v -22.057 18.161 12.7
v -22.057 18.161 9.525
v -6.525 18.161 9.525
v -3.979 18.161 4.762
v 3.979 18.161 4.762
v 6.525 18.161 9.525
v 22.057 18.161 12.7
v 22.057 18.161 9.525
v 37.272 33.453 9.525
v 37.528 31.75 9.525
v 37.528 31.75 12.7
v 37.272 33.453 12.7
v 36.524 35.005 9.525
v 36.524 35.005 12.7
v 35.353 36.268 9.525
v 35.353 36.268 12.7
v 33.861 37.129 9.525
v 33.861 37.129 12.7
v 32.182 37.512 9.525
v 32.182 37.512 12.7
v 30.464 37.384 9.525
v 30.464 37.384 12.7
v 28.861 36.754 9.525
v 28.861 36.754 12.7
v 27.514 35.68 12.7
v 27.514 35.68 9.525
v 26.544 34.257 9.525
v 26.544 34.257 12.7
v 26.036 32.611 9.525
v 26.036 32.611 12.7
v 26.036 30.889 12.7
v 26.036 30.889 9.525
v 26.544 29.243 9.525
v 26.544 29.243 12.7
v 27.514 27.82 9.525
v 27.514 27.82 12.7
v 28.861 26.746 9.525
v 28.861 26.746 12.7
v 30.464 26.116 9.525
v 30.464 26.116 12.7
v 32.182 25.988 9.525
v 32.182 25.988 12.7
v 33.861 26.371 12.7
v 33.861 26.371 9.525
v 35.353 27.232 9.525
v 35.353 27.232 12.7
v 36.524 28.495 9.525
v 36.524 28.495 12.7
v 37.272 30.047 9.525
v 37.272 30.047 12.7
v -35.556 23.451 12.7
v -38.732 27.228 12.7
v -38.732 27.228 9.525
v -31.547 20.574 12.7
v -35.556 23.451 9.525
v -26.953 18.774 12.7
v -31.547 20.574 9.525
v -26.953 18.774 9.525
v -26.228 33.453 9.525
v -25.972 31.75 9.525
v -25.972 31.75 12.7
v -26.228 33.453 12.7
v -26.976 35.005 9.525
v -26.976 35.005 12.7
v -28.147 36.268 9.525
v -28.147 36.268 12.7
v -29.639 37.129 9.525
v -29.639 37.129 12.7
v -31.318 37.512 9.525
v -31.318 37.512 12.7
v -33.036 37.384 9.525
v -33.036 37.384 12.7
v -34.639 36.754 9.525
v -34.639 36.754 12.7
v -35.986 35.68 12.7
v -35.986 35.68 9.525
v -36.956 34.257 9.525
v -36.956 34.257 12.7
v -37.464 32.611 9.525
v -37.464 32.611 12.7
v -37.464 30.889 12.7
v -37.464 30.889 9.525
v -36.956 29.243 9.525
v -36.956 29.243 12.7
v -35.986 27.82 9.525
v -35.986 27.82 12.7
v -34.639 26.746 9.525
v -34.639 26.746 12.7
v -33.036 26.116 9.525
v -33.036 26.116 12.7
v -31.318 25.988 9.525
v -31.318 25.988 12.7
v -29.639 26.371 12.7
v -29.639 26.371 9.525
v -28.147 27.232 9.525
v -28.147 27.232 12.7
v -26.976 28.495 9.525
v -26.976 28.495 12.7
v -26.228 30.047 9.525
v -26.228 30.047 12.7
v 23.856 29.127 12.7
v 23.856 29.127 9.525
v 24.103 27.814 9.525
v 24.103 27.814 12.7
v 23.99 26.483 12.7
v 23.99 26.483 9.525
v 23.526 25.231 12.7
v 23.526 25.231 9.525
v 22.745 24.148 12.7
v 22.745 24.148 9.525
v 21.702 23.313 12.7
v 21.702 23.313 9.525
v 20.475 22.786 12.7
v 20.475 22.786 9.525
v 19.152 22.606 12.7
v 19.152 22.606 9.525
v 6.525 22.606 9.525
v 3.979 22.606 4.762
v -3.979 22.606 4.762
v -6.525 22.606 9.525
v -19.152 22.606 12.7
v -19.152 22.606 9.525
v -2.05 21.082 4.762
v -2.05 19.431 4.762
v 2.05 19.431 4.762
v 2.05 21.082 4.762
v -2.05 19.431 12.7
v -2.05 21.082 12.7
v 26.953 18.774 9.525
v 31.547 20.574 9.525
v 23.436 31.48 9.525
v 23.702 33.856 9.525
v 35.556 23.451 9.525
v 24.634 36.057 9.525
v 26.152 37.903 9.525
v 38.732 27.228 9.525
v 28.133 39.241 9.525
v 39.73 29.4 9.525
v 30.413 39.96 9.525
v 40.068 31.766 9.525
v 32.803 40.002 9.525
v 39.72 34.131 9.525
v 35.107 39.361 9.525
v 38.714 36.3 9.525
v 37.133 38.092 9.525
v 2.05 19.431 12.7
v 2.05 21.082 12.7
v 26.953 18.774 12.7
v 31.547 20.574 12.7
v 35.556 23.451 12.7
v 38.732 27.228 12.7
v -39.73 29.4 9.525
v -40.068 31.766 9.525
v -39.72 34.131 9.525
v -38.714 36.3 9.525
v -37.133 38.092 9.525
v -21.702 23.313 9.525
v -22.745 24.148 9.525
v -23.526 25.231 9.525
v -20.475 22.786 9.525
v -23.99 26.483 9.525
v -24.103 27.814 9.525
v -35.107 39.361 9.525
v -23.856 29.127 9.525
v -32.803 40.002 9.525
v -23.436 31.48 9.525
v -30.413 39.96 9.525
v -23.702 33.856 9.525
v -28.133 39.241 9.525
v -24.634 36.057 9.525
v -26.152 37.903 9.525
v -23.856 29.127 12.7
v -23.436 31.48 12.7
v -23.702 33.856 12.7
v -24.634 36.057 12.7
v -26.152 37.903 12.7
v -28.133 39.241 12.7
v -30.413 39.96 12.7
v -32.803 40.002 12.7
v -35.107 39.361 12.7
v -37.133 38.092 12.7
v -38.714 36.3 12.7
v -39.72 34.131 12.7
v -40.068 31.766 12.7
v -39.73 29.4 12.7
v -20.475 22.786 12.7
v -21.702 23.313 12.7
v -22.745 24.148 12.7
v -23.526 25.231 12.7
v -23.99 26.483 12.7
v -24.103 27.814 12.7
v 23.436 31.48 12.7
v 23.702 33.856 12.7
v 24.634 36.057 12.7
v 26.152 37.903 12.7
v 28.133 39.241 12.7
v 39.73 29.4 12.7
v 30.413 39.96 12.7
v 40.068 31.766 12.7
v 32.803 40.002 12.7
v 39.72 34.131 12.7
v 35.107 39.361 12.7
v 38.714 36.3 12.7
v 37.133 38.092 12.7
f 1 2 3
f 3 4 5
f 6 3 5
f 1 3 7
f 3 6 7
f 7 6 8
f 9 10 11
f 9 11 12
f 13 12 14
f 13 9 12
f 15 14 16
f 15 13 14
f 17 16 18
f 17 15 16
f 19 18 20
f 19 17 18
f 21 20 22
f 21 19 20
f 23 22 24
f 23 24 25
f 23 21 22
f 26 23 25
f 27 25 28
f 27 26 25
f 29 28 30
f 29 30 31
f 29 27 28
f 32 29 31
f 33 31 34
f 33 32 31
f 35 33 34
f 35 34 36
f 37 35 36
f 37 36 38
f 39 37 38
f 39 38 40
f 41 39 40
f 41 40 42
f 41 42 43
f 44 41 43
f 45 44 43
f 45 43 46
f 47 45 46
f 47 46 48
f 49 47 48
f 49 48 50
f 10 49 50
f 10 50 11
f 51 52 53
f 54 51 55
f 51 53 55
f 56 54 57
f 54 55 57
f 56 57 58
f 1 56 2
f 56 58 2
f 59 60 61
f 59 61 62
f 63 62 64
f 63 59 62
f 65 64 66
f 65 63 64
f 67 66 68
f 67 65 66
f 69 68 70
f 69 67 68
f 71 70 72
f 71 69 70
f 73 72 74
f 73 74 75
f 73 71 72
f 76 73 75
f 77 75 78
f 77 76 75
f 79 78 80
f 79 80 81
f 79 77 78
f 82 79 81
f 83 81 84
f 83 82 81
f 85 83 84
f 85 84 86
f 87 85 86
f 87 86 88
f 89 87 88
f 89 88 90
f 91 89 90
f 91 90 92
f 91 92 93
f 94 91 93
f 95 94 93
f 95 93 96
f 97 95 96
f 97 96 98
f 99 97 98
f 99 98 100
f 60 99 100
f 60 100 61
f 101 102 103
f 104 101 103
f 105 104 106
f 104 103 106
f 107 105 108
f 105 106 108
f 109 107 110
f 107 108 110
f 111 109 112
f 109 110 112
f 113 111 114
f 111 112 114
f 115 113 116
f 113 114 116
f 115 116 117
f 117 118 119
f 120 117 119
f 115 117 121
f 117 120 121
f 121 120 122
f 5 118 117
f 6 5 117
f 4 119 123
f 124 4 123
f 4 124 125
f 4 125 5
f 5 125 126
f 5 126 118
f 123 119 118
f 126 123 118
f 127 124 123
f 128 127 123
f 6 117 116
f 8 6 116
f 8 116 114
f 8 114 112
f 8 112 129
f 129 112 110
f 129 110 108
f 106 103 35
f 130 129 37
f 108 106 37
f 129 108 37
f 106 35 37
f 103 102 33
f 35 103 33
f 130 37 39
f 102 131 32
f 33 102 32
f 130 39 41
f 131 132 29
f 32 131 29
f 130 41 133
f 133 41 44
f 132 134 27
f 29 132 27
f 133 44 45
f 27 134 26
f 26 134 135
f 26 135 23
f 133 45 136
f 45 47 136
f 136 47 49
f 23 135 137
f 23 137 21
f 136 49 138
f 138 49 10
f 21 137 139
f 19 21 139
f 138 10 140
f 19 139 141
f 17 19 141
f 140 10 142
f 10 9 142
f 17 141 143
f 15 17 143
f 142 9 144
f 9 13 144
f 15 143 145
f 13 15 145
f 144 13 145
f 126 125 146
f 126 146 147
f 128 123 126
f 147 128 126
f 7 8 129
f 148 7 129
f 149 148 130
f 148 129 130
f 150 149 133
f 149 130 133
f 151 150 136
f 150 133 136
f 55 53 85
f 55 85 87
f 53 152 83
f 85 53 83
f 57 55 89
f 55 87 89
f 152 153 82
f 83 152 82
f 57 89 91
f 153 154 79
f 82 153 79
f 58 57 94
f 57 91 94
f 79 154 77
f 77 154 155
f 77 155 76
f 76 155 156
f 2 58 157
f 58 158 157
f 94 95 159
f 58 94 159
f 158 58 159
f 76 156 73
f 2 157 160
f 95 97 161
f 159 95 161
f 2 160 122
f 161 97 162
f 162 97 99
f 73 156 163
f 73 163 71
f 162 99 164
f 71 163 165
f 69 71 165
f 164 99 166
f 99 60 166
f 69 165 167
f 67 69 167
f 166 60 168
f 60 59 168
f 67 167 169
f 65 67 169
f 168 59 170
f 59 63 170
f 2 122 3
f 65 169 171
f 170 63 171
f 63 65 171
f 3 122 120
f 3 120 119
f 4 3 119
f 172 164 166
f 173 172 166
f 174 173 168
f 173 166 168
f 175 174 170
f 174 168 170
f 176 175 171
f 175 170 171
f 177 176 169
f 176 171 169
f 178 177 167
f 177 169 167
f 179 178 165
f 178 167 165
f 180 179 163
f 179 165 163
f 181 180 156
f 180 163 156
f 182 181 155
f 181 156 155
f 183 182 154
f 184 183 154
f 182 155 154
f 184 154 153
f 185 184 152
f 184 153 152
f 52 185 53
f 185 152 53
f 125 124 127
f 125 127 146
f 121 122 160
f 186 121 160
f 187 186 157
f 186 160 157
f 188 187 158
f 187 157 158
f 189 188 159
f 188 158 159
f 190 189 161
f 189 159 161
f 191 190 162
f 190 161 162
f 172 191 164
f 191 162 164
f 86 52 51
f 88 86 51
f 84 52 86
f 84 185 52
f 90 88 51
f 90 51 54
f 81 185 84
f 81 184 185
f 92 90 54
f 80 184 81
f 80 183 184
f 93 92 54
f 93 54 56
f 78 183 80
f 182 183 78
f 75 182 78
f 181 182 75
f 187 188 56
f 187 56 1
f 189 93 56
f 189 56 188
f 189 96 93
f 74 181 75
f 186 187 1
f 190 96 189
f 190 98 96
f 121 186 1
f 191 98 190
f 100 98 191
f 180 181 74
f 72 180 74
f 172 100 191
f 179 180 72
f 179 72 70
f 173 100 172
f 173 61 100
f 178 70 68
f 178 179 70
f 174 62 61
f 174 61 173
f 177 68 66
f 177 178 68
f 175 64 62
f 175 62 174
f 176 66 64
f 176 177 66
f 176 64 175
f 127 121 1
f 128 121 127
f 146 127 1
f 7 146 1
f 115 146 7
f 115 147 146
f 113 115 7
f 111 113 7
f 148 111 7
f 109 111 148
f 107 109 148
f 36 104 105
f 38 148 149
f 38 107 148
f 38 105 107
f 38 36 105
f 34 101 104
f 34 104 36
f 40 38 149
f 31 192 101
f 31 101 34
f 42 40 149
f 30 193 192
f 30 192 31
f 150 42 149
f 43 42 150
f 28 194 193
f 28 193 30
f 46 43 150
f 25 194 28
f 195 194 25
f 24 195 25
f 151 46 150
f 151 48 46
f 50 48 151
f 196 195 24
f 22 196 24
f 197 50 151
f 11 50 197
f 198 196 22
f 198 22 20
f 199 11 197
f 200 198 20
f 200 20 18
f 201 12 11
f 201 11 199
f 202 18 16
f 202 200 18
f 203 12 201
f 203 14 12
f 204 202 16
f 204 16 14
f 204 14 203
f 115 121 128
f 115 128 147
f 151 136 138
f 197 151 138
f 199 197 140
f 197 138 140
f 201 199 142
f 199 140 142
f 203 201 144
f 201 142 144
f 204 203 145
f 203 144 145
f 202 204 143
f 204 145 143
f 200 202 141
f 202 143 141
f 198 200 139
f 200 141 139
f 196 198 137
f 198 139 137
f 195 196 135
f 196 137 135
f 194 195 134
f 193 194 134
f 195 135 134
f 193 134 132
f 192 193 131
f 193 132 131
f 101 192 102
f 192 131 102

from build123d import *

# Parameters (mm, degrees)
SKETCH1_R                      = 5.7785
SKETCH1_W                      = 4.1
SKETCH1_H                      = 1.651
BOSS_EXTRUDE1_DEPTH            = 12.7
CUT_EXTRUDE1_REACH             = 6.445
CUT_EXTRUDE1_DIRECTION_2_DEPTH = 18.4625


with BuildPart() as part:
    # Sketch1 → Boss-Extrude1 (new body)
    with BuildSketch(Plane.XY):
        with BuildLine():
            Line((-22.056518803, 18.161), (22.056518803, 18.161))
            ThreePointArc((22.056518803, 18.161), (31.546886224, 20.574211288), (38.731794688, 27.227612888))
            ThreePointArc((38.731794688, 27.227612888), (32.803412582, 40.00153102), (23.855967837, 29.126700844))
            ThreePointArc((23.855967837, 29.126700844), (23.171856155, 24.662896524), (19.151565806, 22.606))
            Line((19.151565806, 22.606), (-19.151565806, 22.606))
            ThreePointArc((-19.151565806, 22.606), (-23.171856155, 24.662896524), (-23.855967837, 29.126700844))
            ThreePointArc((-23.855967837, 29.126700844), (-32.803412582, 40.00153102), (-38.731794688, 27.227612888))
            ThreePointArc((-38.731794688, 27.227612888), (-31.546886224, 20.574211288), (-22.056518803, 18.161))
        make_face()
        with Locations((-31.75, 31.75)):
            Circle(SKETCH1_R, mode=Mode.SUBTRACT)
        with Locations((31.75, 31.75)):
            Circle(SKETCH1_R, mode=Mode.SUBTRACT)
        with Locations((0, 20.2565)):
            Rectangle(SKETCH1_W, SKETCH1_H, mode=Mode.SUBTRACT)
    extrude(amount=BOSS_EXTRUDE1_DEPTH)

    # Sketch2 → Cut-Extrude1 (cut, up to next)
    with BuildSketch(Plane(origin=(0, 22.606, 0), x_dir=(1, 0, 0), z_dir=(0, 1, 0)), mode=Mode.PRIVATE) as cut_extrude1_sk1:
        Polygon((-46.157400287, -9.525), (-6.524655543, -9.525), (-3.978583924, -4.7625), (3.978583924, -4.7625), (6.524655543, -9.525), (46.157400287, -9.525), (46.157400287, 7.651360298), (-46.157400287, 7.651360298), align=None)
    cut_extrude1_tool1 = extrude(cut_extrude1_sk1.sketch, amount=-CUT_EXTRUDE1_REACH, mode=Mode.PRIVATE) & part.part
    add(cut_extrude1_tool1.solids().sort_by_distance((0, 22.606, 0.728365))[0], mode=Mode.SUBTRACT)

    # Sketch2 → Cut-Extrude1 direction 2 (cut)
    with BuildSketch(Plane(origin=(0, 22.606, 0), x_dir=(1, 0, 0), z_dir=(0, 1, 0))):
        Polygon((-46.157400287, -9.525), (-6.524655543, -9.525), (-3.978583924, -4.7625), (3.978583924, -4.7625), (6.524655543, -9.525), (46.157400287, -9.525), (46.157400287, 7.651360298), (-46.157400287, 7.651360298), align=None)
    extrude(amount=CUT_EXTRUDE1_DIRECTION_2_DEPTH, mode=Mode.SUBTRACT)


solid = part.part
